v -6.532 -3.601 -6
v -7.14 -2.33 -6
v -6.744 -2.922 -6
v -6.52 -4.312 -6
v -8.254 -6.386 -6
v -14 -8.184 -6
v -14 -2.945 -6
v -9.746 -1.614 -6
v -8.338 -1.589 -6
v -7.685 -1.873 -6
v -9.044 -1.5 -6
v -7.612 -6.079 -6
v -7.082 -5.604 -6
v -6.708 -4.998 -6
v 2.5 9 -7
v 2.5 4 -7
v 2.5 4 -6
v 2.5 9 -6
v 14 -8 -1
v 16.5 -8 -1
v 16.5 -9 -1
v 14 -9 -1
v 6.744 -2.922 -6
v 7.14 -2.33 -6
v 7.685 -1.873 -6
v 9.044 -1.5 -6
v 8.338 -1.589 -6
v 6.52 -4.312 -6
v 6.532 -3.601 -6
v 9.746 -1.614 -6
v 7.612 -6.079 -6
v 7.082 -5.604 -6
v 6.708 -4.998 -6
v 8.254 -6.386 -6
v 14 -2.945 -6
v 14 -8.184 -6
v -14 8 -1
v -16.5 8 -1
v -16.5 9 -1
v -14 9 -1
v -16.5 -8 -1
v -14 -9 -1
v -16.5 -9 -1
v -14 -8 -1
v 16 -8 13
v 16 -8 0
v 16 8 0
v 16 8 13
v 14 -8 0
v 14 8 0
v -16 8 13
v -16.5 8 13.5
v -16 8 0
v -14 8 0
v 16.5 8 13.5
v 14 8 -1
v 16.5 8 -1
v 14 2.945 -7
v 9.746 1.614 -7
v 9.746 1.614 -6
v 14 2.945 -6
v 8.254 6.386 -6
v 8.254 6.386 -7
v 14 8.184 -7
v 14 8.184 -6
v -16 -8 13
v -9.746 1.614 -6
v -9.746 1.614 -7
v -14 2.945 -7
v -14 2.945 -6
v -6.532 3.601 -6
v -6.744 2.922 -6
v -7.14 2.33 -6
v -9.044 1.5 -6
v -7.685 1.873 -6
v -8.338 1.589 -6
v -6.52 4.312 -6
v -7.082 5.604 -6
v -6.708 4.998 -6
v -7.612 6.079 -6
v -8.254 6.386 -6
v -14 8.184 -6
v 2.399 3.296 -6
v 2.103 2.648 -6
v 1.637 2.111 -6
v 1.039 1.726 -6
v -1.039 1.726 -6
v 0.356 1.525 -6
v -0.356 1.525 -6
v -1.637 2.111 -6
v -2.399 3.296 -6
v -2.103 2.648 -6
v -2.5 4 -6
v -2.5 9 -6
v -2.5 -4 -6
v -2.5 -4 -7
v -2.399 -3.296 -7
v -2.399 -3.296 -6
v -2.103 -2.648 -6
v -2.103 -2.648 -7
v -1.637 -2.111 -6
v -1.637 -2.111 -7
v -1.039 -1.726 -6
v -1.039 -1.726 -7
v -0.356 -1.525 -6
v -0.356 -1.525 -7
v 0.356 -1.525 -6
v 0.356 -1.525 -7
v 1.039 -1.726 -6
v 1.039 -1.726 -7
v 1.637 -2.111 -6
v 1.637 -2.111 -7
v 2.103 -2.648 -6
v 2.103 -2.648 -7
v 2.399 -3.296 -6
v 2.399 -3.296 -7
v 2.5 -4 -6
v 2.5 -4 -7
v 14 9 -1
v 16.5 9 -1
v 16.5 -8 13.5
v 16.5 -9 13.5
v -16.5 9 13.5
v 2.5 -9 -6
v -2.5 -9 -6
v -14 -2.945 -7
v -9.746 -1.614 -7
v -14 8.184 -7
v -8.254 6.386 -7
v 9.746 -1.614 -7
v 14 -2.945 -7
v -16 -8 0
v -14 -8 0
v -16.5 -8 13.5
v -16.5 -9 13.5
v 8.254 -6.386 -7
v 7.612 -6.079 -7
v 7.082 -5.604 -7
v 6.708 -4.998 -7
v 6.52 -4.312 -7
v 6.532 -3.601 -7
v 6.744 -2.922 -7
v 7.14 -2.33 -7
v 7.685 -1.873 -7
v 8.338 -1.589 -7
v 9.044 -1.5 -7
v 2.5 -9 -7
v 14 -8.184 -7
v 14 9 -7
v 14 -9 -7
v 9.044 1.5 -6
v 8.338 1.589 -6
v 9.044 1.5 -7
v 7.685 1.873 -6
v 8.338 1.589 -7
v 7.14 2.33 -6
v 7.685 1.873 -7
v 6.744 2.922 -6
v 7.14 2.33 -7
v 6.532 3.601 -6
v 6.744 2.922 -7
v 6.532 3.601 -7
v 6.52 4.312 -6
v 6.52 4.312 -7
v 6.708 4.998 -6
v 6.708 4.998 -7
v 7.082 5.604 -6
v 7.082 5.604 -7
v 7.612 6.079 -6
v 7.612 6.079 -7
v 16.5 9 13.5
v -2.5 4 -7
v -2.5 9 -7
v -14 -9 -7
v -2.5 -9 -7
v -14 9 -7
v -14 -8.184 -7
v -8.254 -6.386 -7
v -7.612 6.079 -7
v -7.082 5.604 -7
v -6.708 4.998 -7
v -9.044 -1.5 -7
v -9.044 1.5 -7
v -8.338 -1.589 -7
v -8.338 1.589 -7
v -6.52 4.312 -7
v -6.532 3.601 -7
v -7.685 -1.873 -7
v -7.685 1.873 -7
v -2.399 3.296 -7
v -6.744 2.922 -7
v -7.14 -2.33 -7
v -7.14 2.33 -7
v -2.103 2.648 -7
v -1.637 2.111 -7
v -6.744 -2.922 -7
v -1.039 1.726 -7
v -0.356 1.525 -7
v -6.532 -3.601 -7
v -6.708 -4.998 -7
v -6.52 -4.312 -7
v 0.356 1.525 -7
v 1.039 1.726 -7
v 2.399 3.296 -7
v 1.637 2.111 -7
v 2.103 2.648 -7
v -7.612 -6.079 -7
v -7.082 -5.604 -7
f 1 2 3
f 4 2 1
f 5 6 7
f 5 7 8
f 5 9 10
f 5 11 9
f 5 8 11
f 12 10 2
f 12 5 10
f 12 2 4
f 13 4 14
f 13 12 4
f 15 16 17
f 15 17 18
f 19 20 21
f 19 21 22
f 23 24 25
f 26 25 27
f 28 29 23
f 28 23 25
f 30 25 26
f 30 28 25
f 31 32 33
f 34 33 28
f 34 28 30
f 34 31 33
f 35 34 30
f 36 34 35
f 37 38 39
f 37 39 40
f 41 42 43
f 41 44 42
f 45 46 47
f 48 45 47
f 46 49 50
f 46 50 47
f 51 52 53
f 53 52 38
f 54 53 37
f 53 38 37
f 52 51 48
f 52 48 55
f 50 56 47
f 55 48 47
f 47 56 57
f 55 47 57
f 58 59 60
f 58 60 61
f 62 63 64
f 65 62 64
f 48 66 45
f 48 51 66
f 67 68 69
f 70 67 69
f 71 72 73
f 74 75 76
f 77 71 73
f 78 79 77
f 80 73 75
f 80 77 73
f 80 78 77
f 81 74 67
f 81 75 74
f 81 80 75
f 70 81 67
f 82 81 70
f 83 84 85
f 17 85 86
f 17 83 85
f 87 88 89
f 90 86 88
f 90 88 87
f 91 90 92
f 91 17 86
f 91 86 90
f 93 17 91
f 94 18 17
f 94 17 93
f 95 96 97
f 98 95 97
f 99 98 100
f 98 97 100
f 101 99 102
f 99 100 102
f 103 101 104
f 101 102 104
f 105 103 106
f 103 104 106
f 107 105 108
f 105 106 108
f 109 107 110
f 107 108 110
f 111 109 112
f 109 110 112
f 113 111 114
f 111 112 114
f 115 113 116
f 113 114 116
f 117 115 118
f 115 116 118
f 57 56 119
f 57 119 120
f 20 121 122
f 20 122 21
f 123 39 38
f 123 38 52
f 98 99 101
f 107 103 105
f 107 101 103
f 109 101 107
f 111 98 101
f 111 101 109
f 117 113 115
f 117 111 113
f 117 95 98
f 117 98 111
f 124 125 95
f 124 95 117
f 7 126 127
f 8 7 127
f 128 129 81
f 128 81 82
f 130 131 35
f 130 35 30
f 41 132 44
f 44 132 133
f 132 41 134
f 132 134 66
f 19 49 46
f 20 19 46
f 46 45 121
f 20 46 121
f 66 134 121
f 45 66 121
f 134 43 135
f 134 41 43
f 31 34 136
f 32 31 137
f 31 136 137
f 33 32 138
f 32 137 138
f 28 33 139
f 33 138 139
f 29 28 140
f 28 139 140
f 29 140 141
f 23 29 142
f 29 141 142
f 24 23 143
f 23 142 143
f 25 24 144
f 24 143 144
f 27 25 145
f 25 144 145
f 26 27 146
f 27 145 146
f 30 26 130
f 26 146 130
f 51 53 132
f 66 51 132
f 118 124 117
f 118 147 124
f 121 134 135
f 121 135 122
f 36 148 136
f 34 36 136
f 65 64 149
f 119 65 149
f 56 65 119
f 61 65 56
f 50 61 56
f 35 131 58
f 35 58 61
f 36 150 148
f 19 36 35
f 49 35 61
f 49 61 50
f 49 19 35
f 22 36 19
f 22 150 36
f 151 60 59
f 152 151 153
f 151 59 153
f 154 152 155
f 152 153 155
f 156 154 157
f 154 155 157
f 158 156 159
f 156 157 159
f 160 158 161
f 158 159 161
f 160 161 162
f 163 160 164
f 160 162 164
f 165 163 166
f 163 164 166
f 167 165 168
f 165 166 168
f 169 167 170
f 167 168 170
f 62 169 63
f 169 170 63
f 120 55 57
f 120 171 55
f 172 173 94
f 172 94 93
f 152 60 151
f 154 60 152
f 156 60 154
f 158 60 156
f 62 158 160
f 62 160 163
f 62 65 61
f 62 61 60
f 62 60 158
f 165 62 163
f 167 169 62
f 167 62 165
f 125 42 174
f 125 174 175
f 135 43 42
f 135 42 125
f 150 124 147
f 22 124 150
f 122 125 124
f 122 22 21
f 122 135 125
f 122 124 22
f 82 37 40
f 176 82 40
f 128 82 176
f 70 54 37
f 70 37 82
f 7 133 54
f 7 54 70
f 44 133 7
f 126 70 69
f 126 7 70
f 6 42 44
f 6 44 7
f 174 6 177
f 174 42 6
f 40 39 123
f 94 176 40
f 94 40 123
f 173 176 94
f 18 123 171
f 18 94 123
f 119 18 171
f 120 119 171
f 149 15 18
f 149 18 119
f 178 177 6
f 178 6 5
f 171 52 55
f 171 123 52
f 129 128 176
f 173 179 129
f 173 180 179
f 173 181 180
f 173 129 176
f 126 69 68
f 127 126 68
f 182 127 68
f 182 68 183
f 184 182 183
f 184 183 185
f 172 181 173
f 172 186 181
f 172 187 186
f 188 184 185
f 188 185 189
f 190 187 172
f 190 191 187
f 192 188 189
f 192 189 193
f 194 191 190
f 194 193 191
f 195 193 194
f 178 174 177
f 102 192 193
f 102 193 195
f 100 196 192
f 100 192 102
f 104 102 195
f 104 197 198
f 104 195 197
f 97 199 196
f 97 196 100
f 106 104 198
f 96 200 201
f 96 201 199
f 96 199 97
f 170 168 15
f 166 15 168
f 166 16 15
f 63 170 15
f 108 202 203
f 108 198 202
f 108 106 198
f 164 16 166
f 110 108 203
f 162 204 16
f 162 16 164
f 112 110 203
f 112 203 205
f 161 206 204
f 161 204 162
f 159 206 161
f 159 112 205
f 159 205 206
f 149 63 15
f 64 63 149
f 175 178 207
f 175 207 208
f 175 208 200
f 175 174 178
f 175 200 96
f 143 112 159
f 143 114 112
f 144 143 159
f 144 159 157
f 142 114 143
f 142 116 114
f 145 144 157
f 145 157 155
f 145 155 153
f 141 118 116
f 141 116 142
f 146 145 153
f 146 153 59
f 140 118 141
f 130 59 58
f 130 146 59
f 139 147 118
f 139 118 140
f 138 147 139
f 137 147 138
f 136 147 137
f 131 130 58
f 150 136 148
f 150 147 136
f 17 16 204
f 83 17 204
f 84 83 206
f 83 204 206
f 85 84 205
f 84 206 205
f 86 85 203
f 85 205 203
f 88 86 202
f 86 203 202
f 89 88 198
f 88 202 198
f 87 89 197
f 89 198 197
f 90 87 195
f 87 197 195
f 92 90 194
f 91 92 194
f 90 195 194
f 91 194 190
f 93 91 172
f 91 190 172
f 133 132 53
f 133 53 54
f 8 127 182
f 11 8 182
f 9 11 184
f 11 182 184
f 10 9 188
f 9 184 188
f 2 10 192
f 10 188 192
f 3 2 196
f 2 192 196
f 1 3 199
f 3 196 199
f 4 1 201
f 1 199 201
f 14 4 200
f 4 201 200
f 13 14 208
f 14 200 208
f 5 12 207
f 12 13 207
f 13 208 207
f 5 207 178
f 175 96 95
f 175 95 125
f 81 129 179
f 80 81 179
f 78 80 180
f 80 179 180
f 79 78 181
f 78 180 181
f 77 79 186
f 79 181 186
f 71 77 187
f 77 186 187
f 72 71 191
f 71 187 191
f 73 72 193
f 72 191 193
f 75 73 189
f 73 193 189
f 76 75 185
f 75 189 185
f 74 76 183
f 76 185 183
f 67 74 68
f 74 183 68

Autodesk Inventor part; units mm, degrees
ref_plane "YZ Plane" through (0, 0, 0) normal (1, 0, 0) x (0, 1, 0)
ref_plane "XZ Plane" through (0, 0, 0) normal (0, 1, 0) x (-1, 0, 0)
sketch "Sketch1" plane through (0, 0, 0) normal (0, 0, 1) x (1, 0, 0)
  line L0 (-16, -8) -> (16, -8)
  line L1 (16, -8) -> (16, 8)
  line L2 (16, 8) -> (-16, 8)
  line L3 (-16, 8) -> (-16, -8)
  point P0 (0, 0)
  point P1 (0, 8)
  point P2 (16, 0)
  dimension "d0" = 32
  dimension "d1" = 16
extrude "Extrusion1" add sketch "Sketch1" along normal blind 13
sketch "Sketch2" plane through (-16, -8, 0) normal (0, -1, 0) x (1, 0, 0)
  line L0 (32, 13) -> (0, 13) projected
  line L1 (0, 0) -> (0, 13) projected
  line L2 (0, 0) -> (32, 0) projected
  line L3 (32, 0) -> (32, 13) projected
  line L4 (-1, 14) -> (33, 14)
  line L5 (33, 14) -> (33, -1)
  line L6 (33, -1) -> (-1, -1)
  line L7 (-1, -1) -> (-1, 14)
  line L8 (2, -1) -> (30, -1)
  line L9 (30, -1) -> (30, -7)
  line L10 (30, -7) -> (2, -7)
  line L11 (2, -7) -> (2, -1)
  point P0 (16, 0)
  dimension "d4" = 1
  dimension "d5" = 3
  dimension "d6" = 3
  dimension "d7" = 6
extrude "Extrusion2" add sketch "Sketch2" along normal blind 1 contours L3 L2 L1 L0 | L4 L5 L6 L7 | L6 L9 L10 L11
sketch "Sketch3" plane through (-16, -8, 0) normal (0, 1, 0) x (1, 0, 0)
  line L0 (0, 0) -> (32, 0) projected
  line L1 (2, 7) -> (30, 7)
  line L2 (30, 7) -> (30, 0)
  line L3 (30, 0) -> (2, 0)
  line L4 (2, 0) -> (2, 7)
  point P0 (16, 0)
extrude "Extrusion3" add sketch "Sketch3" along normal up to surface (16 mm away)
sketch "Sketch4" plane through (-16, 8, 13) normal (0, 1, 0) x (1, 0, 0)
  line L0 (0, 0) -> (32, 0) projected
  line L1 (32, 13) -> (32, 0) projected
  line L2 (32, 13) -> (30, 13) projected
  line L3 (30, 20) -> (30, 13) projected
  line L4 (2, 20) -> (30, 20) projected
  line L5 (2, 13) -> (2, 20) projected
  line L6 (2, 13) -> (0, 13) projected
  line L7 (0, 13) -> (0, 0) projected
  line L8 (-1, 14) -> (2, 14) projected
  line L9 (2, 13) -> (2, 14) projected
  line L10 (-1, 14) -> (2, 14) projected
  line L11 (-1, -1) -> (-1, 14) projected
  line L12 (33, -1) -> (-1, -1) projected
  line L13 (33, 14) -> (33, -1) projected
  line L14 (30, 14) -> (33, 14) projected
  line L15 (30, 14) -> (30, 13) projected
  line L16 (30, 13) -> (32, 13) projected
  line L17 (32, 13) -> (32, 0) projected
  line L18 (32, 0) -> (0, 0) projected
  line L19 (0, 13) -> (0, 0) projected
  line L20 (0, 13) -> (2, 13) projected
  point P0 (16, 13)
extrude "Extrusion4" add sketch "Sketch4" along normal blind 1
sketch "Sketch5" plane through (14, -9, -7) normal (0, 0, -1) x (-1, 0, 0)
  line L0 (28, 0) -> (28, 18) projected
  line L1 (28, 18) -> (0, 18) projected
  line L2 (0, 18) -> (0, 0) projected
  line L3 (11.5, 18) -> (16.5, 18)
  line L4 (16.5, 18) -> (16.5, 13)
  line L5 (16.5, 13) -> (11.5, 13)
  line L6 (11.5, 13) -> (11.5, 18)
  circle A0 centre (14, 13) radius 2.5
  circle A1 centre (23, 13) radius 2.5
  line L7 (23.7463, 10.614) -> (28, 11.9446)
  line L8 (22.2537, 15.386) -> (28, 17.1835)
  circle A2 centre (5, 13) radius 2.5
  line L9 (4.2537, 10.614) -> (0, 11.9446)
  line L10 (5.7463, 15.386) -> (0, 17.1835)
  point P0 (14, 9)
  point P1 (14, 18)
  point P2 (14, 18)
  dimension "d14" = 5
  dimension "d15" = 5
  dimension "d16" = 5
  dimension "d17" = 9
  dimension "d18" = 5
  dimension "d19" = 9
extrude "Extrusion5" cut sketch "Sketch5" against normal blind 1
ref_plane "Work Plane1" through (-16, 0, 13) normal (0, 1, 0) x (1, 0, 0)
mirror "Mirror1" about plane through (-16, 0, 13) normal (0, 1, 0) of "Extrusion5"
sketch "Sketch6" plane through (-17, -8, 14) normal (0, 0, 1) x (1, 0, 0)
  line L0 (0, -1) -> (34, -1) projected
  line L1 (34, 0) -> (34, -1) projected
  line L2 (34, 0) -> (0, 0) projected
  line L3 (0, 0) -> (0, -1) projected
  line L4 (34, 17) -> (0, 17) projected
  line L5 (0, 16) -> (0, 17) projected
  line L6 (0, 16) -> (34, 16) projected
  line L7 (34, 16) -> (34, 17) projected
  point P0 (17, 8)
extrude "Extrusion6" cut sketch "Sketch6" against normal blind 0.5
sketch "Sketch7" plane through (17, -9, -1) normal (1, 0, 0) x (0, 0, -1)
  line L0 (-14.5, 1) -> (-14.5, 0) projected
  line L1 (-14.5, 0) -> (0, 0) projected
  line L2 (0, 1) -> (0, 0) projected
  line L3 (0, 1) -> (-14.5, 1) projected
  line L4 (-14.5, 18) -> (-14.5, 17) projected
  line L5 (-14.5, 17) -> (0, 17) projected
  line L6 (0, 17) -> (0, 18) projected
  line L7 (0, 18) -> (-14.5, 18) projected
  point P0 (-1, 9)
extrude "Extrusion7" cut sketch "Sketch7" against normal blind 0.5
sketch "Sketch8" plane through (-17, 8, -1) normal (-1, 0, 0) x (0, 0, 1)
  line L0 (14.5, 0) -> (14.5, 1) projected
  line L1 (14.5, 1) -> (0, 1) projected
  line L2 (0, 0) -> (0, 1) projected
  line L3 (0, 0) -> (14.5, 0) projected
  line L4 (14.5, -17) -> (14.5, -16) projected
  line L5 (14.5, -16) -> (0, -16) projected
  line L6 (0, -16) -> (0, -17) projected
  line L7 (0, -17) -> (14.5, -17) projected
  point P0 (1, -8)
extrude "Extrusion8" cut sketch "Sketch8" against normal blind 0.5
equation "\"d6\" = d5"
properties part number "03"
